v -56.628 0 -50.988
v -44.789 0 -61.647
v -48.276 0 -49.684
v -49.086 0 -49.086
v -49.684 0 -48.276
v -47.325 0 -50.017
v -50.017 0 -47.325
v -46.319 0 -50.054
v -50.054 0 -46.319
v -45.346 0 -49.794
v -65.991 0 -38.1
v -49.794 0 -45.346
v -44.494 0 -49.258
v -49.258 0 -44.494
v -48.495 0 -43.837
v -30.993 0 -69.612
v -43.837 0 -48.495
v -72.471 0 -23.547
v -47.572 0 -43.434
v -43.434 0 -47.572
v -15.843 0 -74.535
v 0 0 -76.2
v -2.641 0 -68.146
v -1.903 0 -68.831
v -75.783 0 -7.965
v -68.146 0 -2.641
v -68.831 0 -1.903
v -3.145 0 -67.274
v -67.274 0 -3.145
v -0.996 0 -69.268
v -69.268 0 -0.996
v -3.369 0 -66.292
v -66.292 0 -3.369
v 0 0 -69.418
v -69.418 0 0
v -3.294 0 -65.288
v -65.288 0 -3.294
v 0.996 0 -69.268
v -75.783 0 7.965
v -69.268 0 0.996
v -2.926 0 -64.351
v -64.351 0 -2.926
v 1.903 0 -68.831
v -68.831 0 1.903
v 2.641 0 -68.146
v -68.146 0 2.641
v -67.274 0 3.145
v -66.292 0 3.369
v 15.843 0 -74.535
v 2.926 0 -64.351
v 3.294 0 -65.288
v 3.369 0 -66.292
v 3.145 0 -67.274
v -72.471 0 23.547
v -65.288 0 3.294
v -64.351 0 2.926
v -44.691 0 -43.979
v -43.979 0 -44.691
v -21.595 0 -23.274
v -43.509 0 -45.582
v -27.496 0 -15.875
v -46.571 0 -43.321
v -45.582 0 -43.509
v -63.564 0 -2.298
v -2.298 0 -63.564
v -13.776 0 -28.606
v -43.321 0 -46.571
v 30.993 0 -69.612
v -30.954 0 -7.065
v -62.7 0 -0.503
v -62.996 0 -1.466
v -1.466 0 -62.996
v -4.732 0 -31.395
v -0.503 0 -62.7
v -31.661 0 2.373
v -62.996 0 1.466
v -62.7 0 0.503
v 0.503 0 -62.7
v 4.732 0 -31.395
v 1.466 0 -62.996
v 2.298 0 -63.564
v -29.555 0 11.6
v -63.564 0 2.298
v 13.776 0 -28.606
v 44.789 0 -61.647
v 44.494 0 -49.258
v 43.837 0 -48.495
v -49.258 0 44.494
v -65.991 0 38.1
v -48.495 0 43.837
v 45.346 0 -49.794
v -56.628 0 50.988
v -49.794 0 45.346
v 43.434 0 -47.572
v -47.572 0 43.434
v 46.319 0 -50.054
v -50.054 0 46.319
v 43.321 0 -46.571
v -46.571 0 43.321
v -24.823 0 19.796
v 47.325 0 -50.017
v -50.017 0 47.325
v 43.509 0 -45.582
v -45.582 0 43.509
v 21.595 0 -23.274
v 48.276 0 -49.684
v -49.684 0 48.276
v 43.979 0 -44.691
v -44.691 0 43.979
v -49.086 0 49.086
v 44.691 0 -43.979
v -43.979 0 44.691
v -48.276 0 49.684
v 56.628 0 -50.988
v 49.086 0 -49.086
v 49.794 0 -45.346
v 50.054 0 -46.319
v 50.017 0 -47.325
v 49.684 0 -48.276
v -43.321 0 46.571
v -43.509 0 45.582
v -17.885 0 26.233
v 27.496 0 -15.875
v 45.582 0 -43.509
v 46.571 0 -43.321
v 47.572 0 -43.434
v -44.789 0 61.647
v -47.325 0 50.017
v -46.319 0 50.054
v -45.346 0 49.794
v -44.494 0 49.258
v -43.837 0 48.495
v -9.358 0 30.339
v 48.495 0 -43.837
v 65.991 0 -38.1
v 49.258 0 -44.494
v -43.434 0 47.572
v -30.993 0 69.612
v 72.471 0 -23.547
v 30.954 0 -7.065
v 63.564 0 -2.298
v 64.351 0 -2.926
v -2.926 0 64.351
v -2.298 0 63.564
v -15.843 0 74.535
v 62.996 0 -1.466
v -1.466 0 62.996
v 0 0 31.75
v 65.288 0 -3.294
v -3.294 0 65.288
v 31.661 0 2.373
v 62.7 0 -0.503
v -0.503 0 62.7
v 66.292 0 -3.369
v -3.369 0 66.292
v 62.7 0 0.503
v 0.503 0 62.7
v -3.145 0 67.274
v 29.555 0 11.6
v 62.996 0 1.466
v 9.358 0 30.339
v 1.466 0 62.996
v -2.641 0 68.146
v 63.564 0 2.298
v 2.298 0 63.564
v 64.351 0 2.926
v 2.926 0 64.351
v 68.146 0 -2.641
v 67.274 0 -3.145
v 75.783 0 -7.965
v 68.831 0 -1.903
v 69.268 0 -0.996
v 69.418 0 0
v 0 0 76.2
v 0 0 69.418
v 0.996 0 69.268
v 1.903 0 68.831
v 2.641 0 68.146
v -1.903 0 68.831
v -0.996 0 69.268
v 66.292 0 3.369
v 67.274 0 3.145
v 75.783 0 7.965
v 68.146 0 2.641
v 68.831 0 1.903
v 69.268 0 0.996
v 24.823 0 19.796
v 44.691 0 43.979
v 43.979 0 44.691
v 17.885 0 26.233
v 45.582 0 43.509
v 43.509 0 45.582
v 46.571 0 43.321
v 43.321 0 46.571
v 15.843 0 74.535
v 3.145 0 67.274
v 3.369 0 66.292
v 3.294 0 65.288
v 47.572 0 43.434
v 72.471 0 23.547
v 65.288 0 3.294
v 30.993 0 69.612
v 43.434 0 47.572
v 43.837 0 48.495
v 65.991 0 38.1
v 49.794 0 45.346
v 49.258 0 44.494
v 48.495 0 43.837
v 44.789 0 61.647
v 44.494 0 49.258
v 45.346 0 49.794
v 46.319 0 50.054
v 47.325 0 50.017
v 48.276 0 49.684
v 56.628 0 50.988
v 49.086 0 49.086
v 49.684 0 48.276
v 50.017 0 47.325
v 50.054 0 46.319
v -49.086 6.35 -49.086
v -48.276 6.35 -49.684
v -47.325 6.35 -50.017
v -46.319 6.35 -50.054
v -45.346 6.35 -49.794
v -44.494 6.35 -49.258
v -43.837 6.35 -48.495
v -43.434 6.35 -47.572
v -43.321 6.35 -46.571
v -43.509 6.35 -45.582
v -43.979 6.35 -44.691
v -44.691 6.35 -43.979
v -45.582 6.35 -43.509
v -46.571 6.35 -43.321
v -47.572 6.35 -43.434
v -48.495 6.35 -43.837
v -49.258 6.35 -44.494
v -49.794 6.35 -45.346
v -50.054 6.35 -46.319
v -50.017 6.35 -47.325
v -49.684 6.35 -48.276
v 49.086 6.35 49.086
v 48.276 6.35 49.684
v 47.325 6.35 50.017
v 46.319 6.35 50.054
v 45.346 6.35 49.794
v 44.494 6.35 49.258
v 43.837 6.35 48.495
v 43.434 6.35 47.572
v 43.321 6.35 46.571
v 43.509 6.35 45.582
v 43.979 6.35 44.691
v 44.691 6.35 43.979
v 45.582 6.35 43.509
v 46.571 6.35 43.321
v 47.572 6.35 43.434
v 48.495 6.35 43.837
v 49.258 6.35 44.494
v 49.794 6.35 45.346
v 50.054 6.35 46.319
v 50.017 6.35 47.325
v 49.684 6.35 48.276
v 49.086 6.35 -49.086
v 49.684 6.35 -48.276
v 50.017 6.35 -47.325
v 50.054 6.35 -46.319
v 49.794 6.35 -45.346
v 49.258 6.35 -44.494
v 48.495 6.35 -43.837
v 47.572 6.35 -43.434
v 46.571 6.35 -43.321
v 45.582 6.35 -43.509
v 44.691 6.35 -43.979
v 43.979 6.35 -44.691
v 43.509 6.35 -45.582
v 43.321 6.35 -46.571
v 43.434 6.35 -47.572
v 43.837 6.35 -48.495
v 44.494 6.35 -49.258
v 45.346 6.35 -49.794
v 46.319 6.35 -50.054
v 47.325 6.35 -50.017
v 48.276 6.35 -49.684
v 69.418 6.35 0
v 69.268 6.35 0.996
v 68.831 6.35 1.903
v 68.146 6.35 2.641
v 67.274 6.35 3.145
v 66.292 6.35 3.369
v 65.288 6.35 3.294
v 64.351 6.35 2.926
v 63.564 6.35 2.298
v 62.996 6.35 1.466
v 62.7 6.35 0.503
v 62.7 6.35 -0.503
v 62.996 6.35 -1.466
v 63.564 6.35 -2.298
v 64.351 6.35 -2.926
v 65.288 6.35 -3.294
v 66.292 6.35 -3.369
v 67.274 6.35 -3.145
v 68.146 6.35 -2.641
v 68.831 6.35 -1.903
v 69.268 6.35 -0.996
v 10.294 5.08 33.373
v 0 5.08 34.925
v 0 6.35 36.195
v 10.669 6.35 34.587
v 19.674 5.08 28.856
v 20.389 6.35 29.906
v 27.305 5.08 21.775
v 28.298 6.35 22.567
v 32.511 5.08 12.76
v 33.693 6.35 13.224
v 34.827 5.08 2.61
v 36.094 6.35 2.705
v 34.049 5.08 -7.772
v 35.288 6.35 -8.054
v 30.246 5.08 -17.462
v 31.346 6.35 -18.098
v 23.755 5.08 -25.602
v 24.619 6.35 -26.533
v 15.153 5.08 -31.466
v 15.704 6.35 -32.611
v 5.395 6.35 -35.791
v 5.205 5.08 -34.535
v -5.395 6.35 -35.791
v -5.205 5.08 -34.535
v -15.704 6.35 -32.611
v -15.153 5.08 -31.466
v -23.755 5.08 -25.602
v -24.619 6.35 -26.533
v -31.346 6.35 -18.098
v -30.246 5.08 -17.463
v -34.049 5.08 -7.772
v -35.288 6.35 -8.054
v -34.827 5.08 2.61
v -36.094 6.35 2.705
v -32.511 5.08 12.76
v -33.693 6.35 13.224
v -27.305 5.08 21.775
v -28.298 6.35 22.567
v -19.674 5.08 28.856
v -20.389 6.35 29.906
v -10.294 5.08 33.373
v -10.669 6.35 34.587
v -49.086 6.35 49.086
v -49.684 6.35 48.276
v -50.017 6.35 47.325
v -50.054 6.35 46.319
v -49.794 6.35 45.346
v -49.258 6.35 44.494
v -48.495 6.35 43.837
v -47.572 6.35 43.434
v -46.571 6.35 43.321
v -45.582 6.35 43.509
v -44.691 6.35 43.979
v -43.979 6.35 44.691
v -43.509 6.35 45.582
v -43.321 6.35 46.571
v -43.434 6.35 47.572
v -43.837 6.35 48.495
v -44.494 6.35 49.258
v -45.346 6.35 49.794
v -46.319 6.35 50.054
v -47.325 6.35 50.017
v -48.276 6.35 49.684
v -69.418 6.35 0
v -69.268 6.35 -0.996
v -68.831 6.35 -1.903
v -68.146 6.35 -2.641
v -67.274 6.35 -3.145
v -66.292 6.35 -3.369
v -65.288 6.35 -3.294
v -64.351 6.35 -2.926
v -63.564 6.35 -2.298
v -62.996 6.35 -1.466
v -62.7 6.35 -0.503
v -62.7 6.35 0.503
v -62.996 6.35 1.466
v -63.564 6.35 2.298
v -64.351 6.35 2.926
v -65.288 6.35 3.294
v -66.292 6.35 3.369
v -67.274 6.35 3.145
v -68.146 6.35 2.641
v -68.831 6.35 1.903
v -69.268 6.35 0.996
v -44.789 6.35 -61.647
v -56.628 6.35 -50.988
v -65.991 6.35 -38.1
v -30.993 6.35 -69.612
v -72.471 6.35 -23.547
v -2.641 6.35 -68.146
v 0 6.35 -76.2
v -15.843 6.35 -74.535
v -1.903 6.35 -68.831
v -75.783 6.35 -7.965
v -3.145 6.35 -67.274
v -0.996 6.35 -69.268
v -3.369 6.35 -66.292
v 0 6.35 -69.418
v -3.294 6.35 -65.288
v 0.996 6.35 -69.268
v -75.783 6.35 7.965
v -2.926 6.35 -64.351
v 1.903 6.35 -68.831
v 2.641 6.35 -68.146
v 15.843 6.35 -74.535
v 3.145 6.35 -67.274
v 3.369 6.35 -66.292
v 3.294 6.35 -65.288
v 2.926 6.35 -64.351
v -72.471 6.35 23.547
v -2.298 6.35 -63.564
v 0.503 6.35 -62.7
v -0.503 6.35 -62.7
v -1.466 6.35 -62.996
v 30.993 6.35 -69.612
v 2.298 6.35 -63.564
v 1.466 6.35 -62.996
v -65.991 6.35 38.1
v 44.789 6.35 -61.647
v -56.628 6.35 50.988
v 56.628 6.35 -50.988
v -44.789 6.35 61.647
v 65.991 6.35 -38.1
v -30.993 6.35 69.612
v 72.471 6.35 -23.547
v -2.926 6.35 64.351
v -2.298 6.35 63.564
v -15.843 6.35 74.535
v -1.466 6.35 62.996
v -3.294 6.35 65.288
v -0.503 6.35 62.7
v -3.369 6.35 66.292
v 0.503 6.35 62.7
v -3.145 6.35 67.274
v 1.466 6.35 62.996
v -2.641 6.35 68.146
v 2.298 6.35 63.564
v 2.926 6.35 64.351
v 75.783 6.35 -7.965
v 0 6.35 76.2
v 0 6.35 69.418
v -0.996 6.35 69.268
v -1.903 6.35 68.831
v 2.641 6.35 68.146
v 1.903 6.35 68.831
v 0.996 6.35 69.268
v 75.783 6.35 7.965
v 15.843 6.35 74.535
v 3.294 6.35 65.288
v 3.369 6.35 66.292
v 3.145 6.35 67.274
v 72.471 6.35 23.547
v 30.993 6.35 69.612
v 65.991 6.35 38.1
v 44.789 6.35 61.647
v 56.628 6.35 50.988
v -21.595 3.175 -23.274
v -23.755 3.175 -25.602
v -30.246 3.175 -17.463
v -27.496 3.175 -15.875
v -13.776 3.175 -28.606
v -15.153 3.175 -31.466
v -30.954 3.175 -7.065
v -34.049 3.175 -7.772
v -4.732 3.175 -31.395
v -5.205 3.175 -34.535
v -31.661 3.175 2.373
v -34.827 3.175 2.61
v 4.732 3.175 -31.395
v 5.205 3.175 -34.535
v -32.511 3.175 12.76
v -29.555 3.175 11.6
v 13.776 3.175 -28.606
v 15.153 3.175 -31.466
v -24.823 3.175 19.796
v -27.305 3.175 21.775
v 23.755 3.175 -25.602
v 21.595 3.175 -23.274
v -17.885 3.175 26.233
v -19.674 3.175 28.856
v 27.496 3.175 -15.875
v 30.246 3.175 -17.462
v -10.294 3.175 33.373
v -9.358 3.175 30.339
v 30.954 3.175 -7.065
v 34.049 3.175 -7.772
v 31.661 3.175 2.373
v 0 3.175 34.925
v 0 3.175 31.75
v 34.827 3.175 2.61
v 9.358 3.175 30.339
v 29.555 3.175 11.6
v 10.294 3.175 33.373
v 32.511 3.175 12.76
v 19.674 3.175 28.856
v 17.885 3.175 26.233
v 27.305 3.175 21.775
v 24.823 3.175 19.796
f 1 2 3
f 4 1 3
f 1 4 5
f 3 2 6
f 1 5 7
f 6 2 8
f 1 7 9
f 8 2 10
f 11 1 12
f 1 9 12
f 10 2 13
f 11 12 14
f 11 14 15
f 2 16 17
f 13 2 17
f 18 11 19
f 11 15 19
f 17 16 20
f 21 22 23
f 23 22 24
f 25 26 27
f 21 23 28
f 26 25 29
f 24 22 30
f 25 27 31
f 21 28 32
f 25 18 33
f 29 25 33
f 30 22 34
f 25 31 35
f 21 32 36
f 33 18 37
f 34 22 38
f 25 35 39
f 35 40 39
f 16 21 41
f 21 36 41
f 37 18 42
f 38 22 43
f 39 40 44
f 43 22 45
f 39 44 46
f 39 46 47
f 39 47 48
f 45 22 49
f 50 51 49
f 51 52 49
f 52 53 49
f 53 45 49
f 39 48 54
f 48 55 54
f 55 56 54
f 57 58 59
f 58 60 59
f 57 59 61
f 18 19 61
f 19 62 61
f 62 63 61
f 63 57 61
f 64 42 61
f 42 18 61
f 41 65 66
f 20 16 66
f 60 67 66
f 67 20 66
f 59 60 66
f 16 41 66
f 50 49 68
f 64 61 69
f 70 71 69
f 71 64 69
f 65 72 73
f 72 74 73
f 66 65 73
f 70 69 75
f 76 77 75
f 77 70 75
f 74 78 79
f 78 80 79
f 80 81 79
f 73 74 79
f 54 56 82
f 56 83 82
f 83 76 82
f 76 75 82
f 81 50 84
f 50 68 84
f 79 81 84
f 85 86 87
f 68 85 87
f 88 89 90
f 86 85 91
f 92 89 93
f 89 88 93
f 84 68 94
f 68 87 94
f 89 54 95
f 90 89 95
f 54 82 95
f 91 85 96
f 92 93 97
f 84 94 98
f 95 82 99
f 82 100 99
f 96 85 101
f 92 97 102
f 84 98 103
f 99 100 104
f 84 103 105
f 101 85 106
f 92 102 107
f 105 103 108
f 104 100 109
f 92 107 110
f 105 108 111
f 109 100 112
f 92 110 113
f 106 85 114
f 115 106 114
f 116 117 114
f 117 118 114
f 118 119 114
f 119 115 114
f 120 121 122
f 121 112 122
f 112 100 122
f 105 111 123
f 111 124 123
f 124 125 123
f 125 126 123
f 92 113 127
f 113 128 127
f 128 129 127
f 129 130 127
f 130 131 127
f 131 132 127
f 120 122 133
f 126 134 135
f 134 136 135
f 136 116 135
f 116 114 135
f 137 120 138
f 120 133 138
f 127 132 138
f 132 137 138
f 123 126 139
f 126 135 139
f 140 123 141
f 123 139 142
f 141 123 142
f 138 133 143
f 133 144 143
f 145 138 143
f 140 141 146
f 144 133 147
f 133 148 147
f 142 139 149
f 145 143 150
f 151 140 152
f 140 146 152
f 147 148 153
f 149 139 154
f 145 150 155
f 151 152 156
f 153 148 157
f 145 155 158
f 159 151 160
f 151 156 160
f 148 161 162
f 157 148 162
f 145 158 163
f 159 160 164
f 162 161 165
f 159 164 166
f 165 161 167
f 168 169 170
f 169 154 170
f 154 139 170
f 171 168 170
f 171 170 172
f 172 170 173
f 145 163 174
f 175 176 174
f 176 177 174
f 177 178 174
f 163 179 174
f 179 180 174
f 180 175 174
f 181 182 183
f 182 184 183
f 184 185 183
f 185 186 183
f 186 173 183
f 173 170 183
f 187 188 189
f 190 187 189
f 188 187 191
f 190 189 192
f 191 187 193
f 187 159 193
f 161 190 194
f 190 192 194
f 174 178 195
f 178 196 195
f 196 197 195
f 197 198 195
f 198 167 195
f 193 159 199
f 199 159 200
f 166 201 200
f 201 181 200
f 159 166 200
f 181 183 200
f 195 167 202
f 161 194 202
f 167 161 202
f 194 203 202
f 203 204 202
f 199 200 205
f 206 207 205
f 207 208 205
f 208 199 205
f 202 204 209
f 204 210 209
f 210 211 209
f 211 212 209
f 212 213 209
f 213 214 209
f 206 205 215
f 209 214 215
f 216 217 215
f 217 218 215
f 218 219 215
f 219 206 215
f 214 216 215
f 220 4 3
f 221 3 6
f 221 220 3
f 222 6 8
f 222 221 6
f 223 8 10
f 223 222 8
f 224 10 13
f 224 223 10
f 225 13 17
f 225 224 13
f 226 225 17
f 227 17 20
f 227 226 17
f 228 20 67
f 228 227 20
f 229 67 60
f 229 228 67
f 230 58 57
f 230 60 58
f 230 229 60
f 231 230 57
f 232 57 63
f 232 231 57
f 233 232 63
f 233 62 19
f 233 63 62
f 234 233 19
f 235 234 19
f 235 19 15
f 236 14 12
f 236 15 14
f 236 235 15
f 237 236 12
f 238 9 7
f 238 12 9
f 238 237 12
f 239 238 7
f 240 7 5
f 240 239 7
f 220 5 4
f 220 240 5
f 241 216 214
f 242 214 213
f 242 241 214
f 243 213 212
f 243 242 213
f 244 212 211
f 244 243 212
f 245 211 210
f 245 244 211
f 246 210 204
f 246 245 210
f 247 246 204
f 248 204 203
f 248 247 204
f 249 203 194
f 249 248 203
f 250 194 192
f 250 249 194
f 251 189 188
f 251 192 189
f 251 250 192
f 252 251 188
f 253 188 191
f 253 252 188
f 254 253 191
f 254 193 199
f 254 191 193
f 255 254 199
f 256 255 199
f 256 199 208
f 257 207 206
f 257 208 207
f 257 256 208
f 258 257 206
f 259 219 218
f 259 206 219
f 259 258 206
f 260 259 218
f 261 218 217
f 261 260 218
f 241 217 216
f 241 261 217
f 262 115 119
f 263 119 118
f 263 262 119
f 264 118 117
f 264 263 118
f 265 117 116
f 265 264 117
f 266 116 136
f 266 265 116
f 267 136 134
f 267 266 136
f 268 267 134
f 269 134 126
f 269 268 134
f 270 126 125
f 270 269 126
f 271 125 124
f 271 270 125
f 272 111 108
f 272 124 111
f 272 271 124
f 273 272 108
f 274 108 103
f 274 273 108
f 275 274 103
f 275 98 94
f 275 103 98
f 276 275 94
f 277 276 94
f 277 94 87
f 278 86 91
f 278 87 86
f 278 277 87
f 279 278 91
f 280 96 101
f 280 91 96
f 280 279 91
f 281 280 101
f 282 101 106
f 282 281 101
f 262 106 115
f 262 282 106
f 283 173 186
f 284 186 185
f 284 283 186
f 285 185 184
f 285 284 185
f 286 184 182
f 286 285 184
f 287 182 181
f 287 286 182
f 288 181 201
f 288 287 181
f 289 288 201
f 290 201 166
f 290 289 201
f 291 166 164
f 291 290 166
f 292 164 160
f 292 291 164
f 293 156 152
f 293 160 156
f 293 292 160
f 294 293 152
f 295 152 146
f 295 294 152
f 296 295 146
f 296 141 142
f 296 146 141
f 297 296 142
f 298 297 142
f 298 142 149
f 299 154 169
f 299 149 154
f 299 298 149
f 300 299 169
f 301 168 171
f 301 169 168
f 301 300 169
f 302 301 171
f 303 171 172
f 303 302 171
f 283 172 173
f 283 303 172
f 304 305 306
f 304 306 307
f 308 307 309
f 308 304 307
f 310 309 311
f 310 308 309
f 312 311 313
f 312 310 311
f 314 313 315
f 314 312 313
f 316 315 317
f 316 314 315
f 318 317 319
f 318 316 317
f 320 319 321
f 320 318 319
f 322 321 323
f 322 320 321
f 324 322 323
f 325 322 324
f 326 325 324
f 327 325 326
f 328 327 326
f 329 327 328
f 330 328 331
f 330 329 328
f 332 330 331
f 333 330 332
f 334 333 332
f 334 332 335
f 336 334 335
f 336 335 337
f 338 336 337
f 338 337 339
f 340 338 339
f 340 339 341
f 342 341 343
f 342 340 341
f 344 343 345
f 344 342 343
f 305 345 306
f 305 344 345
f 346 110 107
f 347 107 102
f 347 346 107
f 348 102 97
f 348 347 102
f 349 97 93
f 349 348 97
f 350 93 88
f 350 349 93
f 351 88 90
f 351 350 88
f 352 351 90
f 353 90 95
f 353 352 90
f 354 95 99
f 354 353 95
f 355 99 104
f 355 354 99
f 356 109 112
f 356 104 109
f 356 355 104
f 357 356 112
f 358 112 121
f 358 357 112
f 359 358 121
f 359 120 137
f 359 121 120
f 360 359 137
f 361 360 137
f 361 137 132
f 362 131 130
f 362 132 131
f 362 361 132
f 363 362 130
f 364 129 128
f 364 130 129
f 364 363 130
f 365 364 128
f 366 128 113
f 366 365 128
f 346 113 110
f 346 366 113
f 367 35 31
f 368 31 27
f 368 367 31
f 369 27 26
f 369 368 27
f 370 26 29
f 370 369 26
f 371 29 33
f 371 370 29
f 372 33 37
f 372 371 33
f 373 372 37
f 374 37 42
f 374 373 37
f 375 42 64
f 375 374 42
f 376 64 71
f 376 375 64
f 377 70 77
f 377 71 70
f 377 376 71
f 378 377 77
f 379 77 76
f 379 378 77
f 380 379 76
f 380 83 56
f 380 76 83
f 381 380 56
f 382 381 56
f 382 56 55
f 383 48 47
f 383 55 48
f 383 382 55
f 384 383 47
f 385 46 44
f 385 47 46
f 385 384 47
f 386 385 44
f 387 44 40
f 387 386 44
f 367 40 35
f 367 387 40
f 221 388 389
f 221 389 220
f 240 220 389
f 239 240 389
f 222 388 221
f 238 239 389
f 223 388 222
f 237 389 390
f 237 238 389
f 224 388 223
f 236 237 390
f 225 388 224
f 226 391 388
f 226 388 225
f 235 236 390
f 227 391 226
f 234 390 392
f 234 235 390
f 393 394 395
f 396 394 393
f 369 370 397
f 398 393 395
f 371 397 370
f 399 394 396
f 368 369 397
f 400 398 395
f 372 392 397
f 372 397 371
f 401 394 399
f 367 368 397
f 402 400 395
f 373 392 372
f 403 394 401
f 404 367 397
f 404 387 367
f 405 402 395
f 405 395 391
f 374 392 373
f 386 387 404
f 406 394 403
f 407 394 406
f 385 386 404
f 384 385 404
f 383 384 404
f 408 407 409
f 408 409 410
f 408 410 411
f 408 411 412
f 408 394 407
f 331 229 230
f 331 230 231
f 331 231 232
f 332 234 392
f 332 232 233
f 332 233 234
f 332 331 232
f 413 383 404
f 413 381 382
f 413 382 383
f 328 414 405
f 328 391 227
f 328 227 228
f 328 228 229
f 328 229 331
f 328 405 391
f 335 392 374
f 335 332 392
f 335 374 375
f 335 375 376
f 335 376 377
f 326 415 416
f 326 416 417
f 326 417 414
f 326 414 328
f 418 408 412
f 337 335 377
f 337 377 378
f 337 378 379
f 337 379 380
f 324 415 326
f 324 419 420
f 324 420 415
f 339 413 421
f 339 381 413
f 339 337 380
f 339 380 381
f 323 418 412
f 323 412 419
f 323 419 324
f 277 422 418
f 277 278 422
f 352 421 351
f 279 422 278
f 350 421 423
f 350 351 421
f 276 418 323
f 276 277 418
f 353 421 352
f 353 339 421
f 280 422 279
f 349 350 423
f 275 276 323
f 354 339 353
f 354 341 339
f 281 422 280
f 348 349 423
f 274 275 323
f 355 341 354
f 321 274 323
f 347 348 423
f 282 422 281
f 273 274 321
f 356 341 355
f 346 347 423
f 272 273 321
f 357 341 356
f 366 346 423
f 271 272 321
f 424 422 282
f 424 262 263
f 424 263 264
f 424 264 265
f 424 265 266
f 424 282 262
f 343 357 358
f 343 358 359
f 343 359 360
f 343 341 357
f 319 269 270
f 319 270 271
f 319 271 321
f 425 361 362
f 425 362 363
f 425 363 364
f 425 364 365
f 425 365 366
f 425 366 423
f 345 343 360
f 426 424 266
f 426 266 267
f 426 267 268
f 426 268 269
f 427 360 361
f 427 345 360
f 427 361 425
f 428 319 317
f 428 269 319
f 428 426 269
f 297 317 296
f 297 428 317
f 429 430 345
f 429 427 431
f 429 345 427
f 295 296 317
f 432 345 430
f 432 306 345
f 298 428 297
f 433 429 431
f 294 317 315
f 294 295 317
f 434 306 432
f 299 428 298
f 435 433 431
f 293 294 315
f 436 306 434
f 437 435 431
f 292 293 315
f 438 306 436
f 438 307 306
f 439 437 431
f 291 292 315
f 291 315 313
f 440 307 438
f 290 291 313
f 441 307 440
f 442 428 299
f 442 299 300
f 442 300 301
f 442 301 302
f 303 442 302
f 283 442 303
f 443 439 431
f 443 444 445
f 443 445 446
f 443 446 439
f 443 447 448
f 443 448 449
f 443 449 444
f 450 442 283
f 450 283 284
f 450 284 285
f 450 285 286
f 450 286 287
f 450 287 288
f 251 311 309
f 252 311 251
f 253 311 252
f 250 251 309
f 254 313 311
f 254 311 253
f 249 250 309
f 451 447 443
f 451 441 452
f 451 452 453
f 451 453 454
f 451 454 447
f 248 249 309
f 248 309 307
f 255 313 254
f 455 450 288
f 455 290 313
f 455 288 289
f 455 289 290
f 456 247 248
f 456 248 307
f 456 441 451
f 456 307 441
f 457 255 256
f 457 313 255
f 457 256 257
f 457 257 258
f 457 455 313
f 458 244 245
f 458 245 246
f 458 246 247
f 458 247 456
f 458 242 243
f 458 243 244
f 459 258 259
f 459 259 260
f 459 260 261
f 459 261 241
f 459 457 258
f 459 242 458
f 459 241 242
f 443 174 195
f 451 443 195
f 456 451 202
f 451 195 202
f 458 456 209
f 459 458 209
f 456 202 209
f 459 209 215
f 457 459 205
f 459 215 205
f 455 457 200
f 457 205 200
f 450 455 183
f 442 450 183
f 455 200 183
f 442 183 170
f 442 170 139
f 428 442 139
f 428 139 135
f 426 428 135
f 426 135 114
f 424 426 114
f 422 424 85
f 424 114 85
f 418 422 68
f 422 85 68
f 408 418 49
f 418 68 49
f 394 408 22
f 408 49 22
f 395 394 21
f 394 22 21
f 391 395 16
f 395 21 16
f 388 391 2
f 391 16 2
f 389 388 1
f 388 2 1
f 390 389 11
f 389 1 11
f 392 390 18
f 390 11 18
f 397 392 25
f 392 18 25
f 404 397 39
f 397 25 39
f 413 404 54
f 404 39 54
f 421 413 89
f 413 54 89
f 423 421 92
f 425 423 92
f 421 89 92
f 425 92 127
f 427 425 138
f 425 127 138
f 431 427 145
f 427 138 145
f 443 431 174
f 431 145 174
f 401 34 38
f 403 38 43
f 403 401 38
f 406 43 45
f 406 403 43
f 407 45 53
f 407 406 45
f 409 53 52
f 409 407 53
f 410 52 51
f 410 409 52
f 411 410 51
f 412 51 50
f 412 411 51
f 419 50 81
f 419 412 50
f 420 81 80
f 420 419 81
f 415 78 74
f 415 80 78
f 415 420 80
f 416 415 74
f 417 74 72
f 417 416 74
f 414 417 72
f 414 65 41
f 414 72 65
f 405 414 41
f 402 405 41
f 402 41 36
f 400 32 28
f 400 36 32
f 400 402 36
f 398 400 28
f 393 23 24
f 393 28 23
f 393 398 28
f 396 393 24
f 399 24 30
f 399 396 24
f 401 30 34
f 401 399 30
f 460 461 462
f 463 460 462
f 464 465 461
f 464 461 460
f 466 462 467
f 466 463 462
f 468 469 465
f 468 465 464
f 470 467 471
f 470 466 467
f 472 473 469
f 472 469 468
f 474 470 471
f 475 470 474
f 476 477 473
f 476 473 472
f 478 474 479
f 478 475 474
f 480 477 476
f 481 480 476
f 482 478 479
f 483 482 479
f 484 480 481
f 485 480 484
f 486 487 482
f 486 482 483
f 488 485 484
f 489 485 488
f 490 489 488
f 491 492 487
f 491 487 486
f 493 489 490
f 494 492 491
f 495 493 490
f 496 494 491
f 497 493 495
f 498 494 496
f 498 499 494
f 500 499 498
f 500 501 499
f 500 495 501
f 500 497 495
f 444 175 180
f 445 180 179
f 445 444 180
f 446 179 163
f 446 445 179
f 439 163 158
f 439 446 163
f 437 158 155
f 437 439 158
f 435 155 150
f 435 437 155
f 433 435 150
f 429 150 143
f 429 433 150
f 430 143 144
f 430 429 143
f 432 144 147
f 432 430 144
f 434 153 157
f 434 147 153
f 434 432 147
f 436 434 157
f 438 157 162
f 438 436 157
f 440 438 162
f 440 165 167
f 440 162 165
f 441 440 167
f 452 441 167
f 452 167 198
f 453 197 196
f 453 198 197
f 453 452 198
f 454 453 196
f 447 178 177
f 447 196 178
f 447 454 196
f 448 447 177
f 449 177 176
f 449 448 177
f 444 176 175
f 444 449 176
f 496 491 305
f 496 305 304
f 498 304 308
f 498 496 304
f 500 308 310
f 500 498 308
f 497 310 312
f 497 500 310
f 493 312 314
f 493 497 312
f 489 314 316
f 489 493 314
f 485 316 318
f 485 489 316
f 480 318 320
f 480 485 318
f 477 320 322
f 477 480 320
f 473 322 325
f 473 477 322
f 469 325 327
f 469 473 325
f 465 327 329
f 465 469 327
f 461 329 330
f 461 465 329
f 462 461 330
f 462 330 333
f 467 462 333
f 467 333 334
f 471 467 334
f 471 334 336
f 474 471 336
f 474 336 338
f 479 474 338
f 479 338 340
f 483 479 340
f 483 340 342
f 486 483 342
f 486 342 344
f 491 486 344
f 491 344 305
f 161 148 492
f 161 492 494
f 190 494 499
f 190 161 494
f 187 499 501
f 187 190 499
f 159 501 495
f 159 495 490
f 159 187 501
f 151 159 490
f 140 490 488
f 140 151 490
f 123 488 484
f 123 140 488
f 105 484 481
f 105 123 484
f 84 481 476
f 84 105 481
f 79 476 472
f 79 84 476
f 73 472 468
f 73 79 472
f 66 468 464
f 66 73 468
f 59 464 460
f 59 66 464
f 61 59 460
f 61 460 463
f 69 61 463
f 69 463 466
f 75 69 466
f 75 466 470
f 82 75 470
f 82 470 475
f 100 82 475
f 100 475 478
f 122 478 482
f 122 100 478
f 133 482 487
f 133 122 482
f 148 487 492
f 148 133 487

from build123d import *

# Parameters (mm, degrees)
SKETCH1_R           = 76.2
SKETCH1_R_2         = 34.925
BOSS_EXTRUDE1_DEPTH = 6.35
CIRPATTERN1_COUNT   = 8
CHAMFER1_SIZE       = 1.27
SKETCH6_R           = 34.925
SKETCH6_R_2         = 31.75
BOSS_EXTRUDE2_DEPTH = 3.175


with BuildPart() as part:
    # Sketch1 → Boss-Extrude1 (new body)
    with BuildSketch(Plane(origin=(0, 0, 0), x_dir=(1, 0, 0), z_dir=(0, 1, 0))):
        Circle(SKETCH1_R)
        Circle(SKETCH1_R_2, mode=Mode.SUBTRACT)
    extrude(amount=BOSS_EXTRUDE1_DEPTH)

    # Sketch4 → 1/4 Clearance Hole1 (revolve, cut)
    with BuildSketch(Plane(origin=(0, 6.35, 66.04), x_dir=(0, 0, 1), z_dir=(1, 0, 0))):
        Polygon((0, 0), (0, 27.429827343), (3.3782, 25.4), (3.3782, 0), align=None)
    f_1_4_clearance_hole1 = revolve(axis=Axis((0, 12.7, 66.04), (0, -1, 0)), mode=Mode.SUBTRACT)

    # CirPattern1: 1/4 Clearance Hole1 ×8 about axis
    cirpattern1_axis = Axis((0, 6.6675, 0), (0, -1, 0))
    for i in range(1, CIRPATTERN1_COUNT):
        add(f_1_4_clearance_hole1.rotate(cirpattern1_axis, i * 360 / CIRPATTERN1_COUNT), mode=Mode.SUBTRACT)

    # Chamfer1
    chamfer1_edges = [part.edges().sort_by_distance(p)[0] for p in [
        (-34.925, 6.35, 0),
    ]]
    chamfer(chamfer1_edges, length=CHAMFER1_SIZE)

    # Sketch6 → Boss-Extrude2 (add)
    with BuildSketch(Plane(origin=(0, 0, 0), x_dir=(1, 0, 0), z_dir=(0, 1, 0))):
        Circle(SKETCH6_R)
        Circle(SKETCH6_R_2, mode=Mode.SUBTRACT)
    extrude(amount=BOSS_EXTRUDE2_DEPTH)


solid = part.part
